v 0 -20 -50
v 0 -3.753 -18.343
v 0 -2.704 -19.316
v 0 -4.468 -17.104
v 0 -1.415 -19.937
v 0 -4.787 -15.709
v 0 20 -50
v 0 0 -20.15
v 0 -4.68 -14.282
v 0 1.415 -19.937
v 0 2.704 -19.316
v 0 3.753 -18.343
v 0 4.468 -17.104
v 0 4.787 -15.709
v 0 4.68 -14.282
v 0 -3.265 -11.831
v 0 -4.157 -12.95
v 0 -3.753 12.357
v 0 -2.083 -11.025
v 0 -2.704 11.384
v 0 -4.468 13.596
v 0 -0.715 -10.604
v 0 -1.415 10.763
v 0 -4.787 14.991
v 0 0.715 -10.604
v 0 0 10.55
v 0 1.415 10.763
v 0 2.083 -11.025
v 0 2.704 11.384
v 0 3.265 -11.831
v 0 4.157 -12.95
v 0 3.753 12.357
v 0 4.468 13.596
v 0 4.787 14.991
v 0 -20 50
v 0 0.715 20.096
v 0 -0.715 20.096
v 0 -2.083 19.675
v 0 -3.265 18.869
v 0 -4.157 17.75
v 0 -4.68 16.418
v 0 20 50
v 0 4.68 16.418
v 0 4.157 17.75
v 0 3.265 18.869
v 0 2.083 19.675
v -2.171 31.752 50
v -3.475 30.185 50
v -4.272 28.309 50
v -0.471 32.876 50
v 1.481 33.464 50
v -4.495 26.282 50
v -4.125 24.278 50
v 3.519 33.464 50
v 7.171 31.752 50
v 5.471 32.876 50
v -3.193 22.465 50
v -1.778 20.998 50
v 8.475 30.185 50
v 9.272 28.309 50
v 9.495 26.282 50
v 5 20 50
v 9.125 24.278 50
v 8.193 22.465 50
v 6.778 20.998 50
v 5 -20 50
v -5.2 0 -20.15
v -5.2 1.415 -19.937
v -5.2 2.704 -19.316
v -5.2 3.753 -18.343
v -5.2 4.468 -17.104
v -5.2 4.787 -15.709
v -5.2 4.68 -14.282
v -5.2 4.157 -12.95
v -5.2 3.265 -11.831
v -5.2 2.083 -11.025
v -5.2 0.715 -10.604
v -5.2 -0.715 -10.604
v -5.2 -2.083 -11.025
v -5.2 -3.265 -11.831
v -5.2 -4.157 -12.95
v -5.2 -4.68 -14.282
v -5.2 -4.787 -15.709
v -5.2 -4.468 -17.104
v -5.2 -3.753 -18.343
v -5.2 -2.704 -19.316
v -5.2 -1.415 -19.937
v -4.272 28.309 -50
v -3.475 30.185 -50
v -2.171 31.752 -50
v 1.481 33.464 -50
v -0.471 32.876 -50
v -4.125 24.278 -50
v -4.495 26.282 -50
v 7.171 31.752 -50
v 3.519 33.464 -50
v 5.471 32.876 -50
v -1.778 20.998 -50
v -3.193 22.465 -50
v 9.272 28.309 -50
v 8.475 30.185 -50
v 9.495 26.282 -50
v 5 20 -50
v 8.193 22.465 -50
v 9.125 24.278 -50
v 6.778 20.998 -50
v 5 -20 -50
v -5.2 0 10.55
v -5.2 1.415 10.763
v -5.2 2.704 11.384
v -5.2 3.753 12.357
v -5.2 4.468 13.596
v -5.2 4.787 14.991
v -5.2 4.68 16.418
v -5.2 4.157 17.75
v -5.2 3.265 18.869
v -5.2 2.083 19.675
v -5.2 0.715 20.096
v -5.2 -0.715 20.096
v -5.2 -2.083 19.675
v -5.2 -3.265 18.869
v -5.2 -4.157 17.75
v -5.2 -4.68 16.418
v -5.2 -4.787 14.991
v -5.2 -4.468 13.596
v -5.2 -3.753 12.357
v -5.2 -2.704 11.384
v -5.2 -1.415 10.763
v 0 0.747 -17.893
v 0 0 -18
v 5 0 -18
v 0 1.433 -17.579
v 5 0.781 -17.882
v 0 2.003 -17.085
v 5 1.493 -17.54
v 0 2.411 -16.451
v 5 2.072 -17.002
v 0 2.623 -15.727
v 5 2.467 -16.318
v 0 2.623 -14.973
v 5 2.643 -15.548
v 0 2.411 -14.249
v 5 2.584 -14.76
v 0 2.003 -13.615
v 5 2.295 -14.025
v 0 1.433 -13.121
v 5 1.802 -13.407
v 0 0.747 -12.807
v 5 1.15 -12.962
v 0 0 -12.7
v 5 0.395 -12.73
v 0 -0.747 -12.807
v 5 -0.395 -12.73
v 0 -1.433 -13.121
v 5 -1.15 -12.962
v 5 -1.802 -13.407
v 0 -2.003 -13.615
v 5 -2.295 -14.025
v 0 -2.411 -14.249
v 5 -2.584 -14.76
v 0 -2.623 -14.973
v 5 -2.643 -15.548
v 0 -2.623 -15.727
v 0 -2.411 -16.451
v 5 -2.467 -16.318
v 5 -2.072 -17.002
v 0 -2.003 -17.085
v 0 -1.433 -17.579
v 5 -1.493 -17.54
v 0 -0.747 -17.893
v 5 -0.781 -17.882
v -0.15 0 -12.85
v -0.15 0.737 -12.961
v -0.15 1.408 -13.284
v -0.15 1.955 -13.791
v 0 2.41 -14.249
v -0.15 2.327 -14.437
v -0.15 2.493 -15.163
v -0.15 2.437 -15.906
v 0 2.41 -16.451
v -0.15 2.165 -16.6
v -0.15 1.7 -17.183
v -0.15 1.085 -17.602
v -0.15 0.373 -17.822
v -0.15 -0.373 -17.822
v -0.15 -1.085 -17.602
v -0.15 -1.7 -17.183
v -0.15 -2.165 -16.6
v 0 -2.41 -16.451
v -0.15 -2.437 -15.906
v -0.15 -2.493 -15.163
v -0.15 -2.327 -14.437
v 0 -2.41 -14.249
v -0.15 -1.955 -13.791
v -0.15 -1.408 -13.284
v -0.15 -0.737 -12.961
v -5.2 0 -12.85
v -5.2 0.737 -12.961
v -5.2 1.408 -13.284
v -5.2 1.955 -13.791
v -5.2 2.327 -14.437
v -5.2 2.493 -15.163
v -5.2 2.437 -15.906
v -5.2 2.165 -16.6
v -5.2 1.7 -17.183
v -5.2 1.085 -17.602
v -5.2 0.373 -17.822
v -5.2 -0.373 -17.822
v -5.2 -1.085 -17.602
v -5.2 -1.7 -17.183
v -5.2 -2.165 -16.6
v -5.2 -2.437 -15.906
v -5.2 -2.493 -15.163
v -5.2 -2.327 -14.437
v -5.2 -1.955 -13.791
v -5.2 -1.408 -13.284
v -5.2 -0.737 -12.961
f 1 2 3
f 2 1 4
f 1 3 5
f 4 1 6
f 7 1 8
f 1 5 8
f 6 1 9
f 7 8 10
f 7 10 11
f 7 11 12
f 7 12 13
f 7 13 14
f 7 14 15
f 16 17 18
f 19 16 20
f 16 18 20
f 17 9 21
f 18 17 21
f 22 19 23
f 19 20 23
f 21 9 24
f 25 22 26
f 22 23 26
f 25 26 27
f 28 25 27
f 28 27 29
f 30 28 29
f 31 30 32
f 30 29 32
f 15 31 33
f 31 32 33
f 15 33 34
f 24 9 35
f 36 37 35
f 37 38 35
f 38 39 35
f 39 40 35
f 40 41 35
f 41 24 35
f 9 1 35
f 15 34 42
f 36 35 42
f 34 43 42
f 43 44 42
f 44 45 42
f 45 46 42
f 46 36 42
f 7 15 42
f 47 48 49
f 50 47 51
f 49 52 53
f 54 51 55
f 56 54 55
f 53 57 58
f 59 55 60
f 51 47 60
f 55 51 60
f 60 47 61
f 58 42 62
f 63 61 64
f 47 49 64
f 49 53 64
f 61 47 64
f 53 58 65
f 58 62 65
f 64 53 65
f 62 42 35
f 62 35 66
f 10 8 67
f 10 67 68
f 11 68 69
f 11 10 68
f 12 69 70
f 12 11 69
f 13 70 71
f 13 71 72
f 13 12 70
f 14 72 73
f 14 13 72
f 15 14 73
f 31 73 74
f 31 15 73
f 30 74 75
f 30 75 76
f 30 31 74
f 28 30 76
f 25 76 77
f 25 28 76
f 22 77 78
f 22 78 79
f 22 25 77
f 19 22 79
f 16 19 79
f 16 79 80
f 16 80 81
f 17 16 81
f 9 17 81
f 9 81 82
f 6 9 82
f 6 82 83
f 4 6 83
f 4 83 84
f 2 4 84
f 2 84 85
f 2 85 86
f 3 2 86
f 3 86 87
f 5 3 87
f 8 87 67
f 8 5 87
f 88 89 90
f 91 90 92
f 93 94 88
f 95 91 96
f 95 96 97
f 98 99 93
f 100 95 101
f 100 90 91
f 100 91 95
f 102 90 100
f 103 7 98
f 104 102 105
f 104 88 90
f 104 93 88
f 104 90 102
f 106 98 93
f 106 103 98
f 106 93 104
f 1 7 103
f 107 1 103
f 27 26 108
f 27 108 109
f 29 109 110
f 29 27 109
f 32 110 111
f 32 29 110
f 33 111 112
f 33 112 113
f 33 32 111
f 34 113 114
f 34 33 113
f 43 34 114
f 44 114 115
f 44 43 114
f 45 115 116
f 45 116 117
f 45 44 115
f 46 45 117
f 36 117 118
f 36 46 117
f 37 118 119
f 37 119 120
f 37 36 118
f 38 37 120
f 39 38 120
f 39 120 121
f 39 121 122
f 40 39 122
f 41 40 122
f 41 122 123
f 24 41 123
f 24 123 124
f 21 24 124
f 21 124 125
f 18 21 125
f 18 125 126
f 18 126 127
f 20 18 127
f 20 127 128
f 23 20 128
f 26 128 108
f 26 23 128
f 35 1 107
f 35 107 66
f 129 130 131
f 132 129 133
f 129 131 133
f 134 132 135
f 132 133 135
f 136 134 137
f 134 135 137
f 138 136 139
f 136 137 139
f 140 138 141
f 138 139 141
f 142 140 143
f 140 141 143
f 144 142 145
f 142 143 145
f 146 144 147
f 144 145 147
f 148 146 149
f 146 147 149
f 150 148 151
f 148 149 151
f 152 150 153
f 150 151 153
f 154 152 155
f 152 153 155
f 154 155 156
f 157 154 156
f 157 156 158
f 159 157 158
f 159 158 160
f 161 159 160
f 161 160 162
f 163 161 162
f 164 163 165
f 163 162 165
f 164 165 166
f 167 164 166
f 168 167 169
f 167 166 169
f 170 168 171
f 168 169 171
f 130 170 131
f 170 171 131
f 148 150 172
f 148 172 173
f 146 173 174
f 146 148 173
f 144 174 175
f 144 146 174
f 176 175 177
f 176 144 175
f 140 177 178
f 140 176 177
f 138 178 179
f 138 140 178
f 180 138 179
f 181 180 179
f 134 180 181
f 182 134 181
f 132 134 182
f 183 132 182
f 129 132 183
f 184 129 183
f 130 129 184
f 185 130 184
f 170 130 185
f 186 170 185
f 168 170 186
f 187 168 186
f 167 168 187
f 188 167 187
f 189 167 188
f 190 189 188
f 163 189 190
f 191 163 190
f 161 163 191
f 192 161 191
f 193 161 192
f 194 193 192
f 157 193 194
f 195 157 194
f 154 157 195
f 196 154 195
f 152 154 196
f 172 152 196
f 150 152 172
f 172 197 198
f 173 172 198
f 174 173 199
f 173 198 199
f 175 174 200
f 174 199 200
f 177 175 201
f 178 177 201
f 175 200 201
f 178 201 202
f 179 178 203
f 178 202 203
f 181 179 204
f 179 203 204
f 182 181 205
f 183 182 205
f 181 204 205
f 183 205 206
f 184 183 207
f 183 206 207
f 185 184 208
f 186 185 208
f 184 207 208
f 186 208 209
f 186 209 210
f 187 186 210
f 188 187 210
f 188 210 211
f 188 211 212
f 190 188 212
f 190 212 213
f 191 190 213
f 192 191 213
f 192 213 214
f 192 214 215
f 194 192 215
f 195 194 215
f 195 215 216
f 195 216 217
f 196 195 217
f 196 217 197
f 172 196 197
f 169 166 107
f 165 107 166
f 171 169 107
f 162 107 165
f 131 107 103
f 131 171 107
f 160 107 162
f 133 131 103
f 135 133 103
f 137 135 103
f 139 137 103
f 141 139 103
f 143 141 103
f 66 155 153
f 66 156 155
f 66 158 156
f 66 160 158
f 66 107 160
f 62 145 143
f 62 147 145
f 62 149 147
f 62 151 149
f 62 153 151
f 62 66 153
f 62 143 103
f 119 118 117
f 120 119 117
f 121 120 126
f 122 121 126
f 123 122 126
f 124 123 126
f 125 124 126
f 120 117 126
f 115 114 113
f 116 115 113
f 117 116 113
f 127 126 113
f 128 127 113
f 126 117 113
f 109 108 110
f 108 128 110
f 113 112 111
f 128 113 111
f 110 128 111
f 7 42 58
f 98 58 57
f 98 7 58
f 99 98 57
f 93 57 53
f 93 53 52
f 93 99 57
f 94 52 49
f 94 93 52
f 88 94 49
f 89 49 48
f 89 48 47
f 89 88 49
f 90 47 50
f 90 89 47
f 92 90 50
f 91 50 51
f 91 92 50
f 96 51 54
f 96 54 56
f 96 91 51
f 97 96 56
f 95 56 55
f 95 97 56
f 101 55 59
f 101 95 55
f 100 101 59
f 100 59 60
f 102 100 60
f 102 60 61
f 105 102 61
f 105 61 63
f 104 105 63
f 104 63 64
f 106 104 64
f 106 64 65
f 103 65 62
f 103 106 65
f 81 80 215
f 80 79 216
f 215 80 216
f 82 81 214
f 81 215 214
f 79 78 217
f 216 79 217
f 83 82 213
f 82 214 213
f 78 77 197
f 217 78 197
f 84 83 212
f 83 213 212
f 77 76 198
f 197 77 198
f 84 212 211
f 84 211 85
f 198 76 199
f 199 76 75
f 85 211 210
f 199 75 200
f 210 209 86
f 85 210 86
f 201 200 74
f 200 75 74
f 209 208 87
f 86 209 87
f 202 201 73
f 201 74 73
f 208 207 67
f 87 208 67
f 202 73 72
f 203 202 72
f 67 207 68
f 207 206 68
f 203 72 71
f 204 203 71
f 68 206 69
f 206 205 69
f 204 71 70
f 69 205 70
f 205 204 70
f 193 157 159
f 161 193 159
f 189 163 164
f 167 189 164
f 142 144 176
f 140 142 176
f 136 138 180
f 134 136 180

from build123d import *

# Parameters (mm, degrees)
SKETCH1_W           = 40
SKETCH1_H           = 100
SKETCH1_R           = 4.8
BOSS_EXTRUDE1_DEPTH = 5
SKETCH1_3_R         = 4.8
BOSS_EXTRUDE2_DEPTH = 5.2
SKETCH2_R           = 2.5
CUT_EXTRUDE1_DEPTH  = 55.809123328
SKETCH3_R           = 2.65
CUT_EXTRUDE2_DEPTH  = 5
CHAMFER1_SIZE       = 0.15
BOSS_EXTRUDE3_DEPTH = 100


with BuildPart() as part:
    # Sketch1 → Boss-Extrude1 (new body)
    # profile 1 of 3: a face of its own
    with BuildSketch(Plane.YZ):
        Rectangle(SKETCH1_W, SKETCH1_H)
        with Locations((0, -15.35)):
            Circle(SKETCH1_R, mode=Mode.SUBTRACT)
        with Locations((0, 15.35)):
            Circle(SKETCH1_R, mode=Mode.SUBTRACT)
    # profile 2 of 3: a face of its own
    with BuildSketch(Plane.YZ):
        with Locations((0, -15.35)):
            Circle(SKETCH1_R)
    # profile 3 of 3: a face of its own
    with BuildSketch(Plane.YZ):
        with Locations((0, 15.35)):
            Circle(SKETCH1_R)
    extrude(amount=BOSS_EXTRUDE1_DEPTH)

    # Sketch1<3> → Boss-Extrude2 (add)
    with BuildSketch(Plane.YZ):
        with Locations(Location((0, 15.35, 0), (0, 0, 270))):
            Circle(SKETCH1_3_R)
        with Locations(Location((0, -15.35, 0), (0, 0, 270))):
            Circle(SKETCH1_3_R)
    extrude(amount=-BOSS_EXTRUDE2_DEPTH)

    # Sketch2 → Cut-Extrude1 (cut, through all)
    with BuildSketch(Plane(origin=(-5.2, 0, 0), x_dir=(0, -1, 0), z_dir=(-1, 0, 0))):
        with Locations(Location((0, -15.35, 0), (0, 0, 90))):
            Circle(SKETCH2_R)
    extrude(amount=-CUT_EXTRUDE1_DEPTH, mode=Mode.SUBTRACT)

    # Sketch3 → Cut-Extrude2 (cut)
    with BuildSketch(Plane(origin=(5, 0, 0), x_dir=(0, 0, -1), z_dir=(1, 0, 0))):
        with Locations((15.35, 0)):
            Circle(SKETCH3_R)
    extrude(amount=-CUT_EXTRUDE2_DEPTH, mode=Mode.SUBTRACT)

    # Chamfer1
    chamfer1_edges = [part.edges().sort_by_distance(p)[0] for p in [
        (0, 0, -17.85),
    ]]
    chamfer(chamfer1_edges, length=CHAMFER1_SIZE - 0.0001)  # a hair under: the kernel refuses the full size

    # Sketch4 → Boss-Extrude3 (add)
    with BuildSketch(Plane(origin=(0, 0, -50), x_dir=(1, 0, 0), z_dir=(0, 0, -1))):
        with BuildLine():
            Line((5, -20), (0, -20))
            ThreePointArc((0, -20), (2.5, -33.538348415), (5, -20))
        make_face()
    extrude(amount=-BOSS_EXTRUDE3_DEPTH)


solid = part.part
